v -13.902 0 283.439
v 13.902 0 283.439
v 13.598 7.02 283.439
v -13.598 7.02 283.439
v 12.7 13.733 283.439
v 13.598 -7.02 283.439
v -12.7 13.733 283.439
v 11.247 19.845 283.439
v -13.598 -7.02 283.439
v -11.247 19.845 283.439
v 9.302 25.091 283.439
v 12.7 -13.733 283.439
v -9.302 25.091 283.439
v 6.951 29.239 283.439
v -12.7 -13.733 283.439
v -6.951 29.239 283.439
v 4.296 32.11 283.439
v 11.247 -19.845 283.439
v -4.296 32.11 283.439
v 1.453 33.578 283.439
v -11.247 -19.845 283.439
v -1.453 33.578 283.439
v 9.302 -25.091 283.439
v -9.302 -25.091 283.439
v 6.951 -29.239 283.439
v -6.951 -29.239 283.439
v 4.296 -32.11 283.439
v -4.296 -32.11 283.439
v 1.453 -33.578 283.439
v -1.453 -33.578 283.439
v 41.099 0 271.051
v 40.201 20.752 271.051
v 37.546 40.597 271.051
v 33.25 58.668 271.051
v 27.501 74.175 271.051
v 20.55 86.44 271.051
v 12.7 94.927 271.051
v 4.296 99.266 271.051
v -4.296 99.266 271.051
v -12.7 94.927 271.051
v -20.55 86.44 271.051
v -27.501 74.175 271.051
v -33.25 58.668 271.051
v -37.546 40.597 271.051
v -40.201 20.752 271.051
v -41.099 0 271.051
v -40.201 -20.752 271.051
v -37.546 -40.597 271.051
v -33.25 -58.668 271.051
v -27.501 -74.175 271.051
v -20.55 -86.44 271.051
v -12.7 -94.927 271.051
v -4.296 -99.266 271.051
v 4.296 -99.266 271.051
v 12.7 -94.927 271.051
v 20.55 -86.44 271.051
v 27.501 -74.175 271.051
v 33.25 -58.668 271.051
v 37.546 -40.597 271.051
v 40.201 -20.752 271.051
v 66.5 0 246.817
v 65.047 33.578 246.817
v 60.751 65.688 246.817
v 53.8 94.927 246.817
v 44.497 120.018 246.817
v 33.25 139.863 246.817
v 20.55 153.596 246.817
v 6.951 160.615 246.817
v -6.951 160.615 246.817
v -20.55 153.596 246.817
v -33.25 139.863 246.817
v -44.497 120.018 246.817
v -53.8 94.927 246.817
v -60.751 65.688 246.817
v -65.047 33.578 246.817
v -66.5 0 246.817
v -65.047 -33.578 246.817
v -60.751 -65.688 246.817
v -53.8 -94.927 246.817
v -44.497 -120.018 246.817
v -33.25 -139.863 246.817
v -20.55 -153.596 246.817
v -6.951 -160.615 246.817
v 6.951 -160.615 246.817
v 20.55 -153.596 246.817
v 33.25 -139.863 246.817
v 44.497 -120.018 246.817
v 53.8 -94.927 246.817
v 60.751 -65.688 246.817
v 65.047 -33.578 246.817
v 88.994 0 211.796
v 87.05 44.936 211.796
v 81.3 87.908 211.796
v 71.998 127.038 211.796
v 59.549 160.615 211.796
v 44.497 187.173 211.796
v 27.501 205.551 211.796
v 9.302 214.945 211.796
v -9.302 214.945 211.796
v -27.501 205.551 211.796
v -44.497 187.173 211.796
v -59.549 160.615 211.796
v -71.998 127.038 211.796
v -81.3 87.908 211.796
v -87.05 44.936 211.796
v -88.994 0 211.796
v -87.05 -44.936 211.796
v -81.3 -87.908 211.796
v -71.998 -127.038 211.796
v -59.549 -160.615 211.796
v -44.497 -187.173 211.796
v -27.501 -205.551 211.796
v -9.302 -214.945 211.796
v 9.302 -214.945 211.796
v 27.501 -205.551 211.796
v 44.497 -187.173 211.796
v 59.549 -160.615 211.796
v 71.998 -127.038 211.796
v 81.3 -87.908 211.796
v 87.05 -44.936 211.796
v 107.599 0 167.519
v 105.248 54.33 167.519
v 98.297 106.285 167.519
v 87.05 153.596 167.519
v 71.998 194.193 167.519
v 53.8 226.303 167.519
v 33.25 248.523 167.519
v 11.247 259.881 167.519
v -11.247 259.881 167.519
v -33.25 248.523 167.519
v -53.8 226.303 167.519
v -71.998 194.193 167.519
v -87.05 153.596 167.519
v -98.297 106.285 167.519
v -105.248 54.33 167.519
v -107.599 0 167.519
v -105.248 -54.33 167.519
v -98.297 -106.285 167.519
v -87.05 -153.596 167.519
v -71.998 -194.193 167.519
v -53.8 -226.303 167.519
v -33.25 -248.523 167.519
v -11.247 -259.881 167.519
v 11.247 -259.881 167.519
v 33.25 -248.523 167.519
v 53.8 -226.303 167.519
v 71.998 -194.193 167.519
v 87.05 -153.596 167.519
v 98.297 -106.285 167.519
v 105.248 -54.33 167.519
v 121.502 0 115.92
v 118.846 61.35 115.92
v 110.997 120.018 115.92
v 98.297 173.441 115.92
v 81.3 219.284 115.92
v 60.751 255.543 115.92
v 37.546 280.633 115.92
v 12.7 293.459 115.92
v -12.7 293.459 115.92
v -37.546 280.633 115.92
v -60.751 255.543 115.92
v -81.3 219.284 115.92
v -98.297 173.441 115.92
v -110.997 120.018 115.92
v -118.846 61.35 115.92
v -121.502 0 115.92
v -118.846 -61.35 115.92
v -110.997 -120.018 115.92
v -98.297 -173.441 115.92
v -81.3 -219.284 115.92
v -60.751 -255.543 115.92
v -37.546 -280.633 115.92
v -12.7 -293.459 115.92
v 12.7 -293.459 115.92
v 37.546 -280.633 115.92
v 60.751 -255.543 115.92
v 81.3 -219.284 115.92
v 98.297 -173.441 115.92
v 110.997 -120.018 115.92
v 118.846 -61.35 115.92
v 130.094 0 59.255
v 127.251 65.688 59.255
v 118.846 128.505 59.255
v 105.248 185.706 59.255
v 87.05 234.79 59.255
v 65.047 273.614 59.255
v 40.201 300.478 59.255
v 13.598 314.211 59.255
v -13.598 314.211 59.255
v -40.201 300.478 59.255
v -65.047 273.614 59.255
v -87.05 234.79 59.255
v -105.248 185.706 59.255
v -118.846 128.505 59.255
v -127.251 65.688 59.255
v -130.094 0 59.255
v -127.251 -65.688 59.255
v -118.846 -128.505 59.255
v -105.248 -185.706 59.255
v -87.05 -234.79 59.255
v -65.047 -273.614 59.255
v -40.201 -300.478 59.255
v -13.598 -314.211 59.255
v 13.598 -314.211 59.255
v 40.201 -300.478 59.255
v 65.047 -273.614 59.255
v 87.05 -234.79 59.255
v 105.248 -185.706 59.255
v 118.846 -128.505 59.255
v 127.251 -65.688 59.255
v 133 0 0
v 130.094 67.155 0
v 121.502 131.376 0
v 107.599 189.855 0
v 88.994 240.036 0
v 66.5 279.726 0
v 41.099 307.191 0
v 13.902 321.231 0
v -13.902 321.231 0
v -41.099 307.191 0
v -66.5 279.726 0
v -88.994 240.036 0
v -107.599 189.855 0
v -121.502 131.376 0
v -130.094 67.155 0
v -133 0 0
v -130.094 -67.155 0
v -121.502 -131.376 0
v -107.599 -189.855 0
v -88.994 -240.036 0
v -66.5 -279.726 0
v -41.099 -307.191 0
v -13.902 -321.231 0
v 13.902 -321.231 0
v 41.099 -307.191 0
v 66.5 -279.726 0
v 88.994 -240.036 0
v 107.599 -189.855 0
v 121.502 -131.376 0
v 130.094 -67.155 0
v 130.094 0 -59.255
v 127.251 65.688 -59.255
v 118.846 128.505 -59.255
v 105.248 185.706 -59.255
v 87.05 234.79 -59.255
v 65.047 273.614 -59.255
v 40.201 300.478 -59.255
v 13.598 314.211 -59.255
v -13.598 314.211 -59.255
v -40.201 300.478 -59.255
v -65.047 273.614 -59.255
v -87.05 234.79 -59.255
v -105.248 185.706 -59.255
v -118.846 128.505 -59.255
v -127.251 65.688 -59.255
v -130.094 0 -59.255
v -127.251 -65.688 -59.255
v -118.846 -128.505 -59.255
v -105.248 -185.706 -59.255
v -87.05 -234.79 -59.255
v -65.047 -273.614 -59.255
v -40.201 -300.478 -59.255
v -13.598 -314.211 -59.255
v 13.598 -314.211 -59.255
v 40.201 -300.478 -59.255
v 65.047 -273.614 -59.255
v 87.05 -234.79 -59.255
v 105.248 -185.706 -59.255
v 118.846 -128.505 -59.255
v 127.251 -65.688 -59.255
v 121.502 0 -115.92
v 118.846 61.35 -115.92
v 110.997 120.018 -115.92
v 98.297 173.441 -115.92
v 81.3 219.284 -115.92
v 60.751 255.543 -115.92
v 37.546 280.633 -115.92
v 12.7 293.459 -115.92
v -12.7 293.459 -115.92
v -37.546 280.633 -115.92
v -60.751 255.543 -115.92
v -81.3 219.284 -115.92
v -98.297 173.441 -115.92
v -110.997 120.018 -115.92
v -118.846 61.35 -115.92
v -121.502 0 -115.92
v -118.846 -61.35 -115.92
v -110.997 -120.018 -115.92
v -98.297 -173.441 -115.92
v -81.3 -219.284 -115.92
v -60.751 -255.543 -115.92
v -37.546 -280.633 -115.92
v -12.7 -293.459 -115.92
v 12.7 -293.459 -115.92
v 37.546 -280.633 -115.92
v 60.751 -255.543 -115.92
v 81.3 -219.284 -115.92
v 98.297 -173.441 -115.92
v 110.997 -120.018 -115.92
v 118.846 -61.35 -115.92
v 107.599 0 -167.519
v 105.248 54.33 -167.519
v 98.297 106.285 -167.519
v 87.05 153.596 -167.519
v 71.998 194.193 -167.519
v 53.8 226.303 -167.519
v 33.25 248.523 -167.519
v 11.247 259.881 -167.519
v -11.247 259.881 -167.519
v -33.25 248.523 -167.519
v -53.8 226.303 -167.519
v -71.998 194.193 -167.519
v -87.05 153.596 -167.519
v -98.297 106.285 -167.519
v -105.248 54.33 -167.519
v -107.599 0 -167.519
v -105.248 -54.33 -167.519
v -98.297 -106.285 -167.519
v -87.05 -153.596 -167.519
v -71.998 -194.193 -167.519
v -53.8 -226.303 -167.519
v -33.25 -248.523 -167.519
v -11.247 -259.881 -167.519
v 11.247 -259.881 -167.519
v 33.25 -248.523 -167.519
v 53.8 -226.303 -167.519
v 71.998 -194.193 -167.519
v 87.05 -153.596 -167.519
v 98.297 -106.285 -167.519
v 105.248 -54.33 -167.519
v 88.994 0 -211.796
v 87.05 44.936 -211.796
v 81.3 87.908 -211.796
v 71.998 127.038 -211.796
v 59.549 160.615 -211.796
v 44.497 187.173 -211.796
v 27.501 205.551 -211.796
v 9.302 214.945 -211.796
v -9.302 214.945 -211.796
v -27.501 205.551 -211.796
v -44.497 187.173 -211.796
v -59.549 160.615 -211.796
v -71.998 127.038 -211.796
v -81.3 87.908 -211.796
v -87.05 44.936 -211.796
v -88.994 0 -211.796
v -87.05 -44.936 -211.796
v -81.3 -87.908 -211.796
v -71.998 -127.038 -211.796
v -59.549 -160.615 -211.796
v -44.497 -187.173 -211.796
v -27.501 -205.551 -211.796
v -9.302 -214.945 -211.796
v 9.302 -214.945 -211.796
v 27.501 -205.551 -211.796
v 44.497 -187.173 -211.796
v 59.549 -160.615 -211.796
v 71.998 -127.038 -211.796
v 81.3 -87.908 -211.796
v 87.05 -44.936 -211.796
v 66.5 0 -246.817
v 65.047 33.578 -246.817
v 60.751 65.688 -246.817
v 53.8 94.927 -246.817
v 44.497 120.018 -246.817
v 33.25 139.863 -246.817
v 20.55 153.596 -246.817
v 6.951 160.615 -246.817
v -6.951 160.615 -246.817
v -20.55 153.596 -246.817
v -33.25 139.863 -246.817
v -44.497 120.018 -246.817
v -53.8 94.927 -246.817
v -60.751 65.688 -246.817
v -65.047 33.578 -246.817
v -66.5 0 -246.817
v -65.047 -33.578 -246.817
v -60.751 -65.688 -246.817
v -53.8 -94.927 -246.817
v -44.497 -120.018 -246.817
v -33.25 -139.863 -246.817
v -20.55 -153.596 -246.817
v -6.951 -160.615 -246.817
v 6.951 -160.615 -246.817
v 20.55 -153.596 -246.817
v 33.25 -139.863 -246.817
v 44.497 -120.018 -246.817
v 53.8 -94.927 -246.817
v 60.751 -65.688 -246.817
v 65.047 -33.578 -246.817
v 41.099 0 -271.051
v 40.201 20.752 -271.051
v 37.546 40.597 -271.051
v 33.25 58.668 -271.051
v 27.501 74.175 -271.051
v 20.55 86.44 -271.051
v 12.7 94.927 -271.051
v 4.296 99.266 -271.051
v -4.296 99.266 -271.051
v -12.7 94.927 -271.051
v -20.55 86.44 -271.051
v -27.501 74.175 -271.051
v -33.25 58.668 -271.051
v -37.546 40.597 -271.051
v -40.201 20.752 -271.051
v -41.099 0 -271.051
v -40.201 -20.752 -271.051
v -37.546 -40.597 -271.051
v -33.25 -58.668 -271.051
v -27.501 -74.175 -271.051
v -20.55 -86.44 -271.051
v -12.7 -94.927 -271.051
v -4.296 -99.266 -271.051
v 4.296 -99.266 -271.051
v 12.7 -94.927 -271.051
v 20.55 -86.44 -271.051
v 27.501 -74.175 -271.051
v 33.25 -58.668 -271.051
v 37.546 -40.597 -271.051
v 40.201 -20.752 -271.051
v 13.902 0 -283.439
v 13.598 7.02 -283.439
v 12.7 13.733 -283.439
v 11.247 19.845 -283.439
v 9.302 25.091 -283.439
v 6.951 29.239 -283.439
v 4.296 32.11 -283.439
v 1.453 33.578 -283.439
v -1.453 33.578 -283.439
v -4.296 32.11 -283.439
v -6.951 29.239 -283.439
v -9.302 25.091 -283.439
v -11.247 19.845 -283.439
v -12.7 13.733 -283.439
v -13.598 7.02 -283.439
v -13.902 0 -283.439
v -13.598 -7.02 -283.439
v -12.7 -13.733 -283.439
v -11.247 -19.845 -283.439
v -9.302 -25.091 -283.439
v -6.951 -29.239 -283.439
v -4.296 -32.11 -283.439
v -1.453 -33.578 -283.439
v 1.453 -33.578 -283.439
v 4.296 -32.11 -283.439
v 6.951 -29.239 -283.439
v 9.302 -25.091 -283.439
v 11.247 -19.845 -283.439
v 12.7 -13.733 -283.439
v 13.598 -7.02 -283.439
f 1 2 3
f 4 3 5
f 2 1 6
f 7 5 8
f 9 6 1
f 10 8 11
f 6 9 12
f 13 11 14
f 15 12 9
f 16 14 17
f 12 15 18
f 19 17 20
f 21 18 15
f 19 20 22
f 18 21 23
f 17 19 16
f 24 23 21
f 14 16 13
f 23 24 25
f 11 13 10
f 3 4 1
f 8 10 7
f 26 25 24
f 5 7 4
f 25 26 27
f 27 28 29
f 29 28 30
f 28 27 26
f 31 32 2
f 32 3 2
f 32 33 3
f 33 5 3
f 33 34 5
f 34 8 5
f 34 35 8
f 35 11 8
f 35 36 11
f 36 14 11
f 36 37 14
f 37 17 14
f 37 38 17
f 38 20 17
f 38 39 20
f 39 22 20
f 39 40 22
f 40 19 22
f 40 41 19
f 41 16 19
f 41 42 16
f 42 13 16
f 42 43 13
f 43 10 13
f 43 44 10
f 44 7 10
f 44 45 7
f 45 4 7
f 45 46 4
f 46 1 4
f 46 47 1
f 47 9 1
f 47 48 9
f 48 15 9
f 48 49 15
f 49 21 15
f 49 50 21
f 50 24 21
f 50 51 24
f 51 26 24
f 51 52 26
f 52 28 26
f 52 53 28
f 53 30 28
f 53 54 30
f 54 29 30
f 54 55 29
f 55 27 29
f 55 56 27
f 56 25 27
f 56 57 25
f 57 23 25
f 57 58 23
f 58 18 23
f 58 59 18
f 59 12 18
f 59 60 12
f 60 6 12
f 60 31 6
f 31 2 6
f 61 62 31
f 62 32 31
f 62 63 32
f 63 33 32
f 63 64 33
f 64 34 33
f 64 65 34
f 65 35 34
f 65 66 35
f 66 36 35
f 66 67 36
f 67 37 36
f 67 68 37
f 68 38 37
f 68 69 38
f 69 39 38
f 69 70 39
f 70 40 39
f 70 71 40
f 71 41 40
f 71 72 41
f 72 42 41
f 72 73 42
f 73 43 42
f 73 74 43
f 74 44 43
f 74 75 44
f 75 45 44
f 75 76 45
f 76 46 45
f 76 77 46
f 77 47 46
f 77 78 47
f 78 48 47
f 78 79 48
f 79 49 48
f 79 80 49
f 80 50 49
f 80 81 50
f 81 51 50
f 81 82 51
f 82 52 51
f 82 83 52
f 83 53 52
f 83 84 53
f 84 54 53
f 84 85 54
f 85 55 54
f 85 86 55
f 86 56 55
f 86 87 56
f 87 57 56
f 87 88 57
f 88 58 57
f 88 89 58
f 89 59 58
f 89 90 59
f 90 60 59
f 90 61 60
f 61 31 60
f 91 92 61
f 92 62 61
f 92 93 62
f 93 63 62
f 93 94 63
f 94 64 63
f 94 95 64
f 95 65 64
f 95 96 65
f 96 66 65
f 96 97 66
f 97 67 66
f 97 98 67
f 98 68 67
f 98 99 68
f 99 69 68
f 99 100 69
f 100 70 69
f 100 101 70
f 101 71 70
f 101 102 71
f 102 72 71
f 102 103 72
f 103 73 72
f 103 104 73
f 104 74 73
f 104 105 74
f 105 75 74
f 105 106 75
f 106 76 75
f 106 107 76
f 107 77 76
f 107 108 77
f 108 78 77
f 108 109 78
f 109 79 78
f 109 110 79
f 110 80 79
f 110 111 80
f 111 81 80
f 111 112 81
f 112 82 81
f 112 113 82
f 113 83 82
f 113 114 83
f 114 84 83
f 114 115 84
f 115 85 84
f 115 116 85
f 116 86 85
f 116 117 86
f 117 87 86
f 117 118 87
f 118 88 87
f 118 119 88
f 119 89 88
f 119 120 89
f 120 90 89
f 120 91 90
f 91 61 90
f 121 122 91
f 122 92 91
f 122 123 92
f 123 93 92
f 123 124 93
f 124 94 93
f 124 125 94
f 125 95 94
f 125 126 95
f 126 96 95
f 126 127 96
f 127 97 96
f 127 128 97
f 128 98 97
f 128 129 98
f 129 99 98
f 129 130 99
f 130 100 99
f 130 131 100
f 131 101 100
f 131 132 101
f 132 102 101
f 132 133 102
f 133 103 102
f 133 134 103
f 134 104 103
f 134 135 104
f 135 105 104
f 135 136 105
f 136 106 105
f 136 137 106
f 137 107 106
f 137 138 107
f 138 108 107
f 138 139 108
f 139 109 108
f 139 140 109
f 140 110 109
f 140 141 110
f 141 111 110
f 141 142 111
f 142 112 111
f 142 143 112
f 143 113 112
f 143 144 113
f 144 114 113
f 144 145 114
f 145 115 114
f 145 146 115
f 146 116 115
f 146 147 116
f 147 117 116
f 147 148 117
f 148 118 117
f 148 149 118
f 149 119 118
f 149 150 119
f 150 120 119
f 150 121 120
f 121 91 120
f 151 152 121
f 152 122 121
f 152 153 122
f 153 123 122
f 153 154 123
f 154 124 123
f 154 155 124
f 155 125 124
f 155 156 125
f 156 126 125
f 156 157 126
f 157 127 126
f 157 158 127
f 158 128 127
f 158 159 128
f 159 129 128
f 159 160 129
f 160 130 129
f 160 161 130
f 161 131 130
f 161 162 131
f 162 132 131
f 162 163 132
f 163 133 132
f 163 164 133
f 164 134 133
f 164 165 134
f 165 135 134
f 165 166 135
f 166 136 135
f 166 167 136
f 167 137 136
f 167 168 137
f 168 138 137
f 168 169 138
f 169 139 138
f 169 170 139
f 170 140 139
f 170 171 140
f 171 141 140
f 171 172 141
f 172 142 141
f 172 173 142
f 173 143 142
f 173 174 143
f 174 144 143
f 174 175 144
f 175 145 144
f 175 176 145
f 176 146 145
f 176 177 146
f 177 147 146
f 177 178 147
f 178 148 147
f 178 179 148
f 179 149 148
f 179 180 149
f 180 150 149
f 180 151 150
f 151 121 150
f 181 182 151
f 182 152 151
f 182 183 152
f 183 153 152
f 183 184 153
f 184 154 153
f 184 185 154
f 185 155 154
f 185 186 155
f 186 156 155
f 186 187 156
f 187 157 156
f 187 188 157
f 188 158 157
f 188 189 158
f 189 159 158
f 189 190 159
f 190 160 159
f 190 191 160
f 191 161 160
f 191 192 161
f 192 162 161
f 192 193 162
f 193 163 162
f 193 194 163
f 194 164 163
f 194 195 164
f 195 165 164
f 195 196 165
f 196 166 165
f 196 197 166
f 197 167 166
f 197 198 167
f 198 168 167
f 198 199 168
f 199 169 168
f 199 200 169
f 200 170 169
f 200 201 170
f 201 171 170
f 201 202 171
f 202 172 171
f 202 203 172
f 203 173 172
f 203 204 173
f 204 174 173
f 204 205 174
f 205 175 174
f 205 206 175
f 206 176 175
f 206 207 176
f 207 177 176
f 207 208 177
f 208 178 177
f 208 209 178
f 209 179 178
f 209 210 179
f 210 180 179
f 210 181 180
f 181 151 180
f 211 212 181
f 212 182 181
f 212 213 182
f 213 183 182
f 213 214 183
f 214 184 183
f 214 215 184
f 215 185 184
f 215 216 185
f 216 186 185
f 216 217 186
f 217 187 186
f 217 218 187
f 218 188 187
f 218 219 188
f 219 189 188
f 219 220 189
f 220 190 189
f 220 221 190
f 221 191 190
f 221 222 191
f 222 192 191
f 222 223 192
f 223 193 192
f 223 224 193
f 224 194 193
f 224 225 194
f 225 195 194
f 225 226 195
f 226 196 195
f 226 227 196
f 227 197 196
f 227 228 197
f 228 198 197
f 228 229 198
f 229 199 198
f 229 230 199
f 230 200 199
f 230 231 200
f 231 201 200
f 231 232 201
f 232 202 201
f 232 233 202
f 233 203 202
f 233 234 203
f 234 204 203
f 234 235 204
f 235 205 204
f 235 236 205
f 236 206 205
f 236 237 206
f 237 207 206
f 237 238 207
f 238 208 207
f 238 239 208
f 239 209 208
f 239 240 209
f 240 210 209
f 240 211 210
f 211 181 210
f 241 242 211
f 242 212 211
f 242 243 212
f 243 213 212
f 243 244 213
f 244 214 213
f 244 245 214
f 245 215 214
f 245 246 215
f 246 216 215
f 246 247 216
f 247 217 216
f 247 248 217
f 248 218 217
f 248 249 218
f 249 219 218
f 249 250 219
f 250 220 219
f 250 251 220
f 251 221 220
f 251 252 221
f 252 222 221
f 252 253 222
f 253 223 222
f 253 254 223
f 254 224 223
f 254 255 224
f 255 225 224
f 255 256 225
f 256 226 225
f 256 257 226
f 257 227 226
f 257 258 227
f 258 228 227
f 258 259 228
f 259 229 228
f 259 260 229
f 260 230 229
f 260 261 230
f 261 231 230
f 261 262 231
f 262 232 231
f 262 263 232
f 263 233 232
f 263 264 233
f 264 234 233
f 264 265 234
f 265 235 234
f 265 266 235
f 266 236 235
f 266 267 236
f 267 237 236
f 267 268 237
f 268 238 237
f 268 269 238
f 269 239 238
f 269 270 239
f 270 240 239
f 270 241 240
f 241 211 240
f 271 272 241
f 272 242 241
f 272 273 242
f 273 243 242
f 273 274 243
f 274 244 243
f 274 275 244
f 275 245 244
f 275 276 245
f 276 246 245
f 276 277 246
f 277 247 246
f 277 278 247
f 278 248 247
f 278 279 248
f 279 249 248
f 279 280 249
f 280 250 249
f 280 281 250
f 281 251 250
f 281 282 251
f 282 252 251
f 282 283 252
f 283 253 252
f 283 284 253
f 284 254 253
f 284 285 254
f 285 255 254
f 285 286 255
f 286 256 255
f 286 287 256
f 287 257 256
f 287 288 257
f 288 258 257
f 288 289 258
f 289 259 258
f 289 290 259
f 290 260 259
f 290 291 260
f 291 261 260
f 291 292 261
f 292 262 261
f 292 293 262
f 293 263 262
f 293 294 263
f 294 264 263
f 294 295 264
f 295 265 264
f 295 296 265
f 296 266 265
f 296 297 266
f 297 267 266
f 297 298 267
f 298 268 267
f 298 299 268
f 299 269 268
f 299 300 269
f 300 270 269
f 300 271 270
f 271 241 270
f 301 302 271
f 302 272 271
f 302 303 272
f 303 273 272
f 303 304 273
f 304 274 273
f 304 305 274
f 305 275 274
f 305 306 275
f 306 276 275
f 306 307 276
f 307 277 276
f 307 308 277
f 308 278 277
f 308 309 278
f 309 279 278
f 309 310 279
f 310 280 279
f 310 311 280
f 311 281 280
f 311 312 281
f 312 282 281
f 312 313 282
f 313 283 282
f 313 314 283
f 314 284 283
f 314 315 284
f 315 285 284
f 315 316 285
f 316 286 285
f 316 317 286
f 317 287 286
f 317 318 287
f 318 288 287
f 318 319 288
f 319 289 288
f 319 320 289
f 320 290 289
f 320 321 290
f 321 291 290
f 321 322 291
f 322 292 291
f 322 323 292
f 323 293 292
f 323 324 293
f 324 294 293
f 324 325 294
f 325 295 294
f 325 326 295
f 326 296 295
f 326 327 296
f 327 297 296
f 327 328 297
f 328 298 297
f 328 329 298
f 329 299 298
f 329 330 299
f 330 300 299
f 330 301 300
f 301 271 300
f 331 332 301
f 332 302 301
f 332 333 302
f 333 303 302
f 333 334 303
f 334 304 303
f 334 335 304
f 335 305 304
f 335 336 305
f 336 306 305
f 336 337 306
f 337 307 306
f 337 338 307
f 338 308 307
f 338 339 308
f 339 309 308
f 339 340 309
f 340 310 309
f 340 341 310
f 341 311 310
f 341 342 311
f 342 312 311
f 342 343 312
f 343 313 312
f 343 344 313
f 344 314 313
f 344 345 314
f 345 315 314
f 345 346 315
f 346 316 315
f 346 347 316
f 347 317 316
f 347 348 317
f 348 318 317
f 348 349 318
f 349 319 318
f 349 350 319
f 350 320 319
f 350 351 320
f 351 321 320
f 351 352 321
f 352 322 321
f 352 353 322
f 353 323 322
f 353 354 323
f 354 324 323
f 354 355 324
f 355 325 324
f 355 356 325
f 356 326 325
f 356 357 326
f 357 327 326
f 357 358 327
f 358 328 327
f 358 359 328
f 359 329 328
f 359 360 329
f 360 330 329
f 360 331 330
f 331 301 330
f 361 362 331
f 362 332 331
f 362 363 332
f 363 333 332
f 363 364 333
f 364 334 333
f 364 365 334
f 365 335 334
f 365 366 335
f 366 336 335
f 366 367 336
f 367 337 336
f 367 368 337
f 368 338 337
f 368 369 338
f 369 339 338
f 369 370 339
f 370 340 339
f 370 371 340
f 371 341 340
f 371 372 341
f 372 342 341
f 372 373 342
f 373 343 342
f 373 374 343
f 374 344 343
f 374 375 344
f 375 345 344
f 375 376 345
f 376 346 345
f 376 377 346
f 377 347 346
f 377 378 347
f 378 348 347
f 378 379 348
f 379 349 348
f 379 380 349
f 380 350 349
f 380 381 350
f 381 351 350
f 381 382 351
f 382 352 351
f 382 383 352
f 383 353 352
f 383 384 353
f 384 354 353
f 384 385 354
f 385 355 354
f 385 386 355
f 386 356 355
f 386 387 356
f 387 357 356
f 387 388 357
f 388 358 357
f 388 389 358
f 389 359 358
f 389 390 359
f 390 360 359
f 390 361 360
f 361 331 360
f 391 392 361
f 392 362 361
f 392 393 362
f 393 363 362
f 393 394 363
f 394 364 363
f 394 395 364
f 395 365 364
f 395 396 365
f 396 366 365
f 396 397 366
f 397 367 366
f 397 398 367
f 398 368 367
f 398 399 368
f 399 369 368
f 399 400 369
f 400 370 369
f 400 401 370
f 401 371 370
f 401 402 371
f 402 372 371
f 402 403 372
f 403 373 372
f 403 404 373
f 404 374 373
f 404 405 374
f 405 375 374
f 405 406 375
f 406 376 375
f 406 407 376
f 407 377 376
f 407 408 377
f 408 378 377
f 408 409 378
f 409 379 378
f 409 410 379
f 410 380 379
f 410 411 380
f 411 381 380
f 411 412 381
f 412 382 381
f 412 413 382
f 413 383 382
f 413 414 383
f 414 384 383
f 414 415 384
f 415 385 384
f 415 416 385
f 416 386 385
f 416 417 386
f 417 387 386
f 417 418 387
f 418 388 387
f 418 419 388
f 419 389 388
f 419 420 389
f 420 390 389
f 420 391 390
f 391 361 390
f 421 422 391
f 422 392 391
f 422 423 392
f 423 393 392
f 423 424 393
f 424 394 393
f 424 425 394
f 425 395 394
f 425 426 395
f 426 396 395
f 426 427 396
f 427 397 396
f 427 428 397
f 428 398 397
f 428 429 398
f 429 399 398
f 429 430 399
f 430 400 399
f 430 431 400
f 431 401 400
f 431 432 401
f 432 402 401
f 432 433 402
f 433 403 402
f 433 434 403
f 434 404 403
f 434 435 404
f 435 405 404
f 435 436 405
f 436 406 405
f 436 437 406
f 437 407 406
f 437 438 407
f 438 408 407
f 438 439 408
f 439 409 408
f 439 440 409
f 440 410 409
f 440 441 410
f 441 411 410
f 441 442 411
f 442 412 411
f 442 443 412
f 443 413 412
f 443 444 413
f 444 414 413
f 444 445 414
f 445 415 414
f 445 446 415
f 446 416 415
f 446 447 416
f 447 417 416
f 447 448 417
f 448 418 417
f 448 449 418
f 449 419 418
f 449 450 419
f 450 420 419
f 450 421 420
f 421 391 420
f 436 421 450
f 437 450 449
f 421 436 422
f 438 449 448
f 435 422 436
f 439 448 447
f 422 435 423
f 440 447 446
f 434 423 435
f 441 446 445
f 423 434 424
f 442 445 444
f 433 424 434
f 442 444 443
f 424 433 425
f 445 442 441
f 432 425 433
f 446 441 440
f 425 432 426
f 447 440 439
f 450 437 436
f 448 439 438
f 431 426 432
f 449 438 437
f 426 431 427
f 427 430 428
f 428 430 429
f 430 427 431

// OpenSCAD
// Generated by SolidPython 1.0.1 on 2020-07-29 00:46:48


scale(v = [7, 17, 15]) {
	sphere(r = 19);
}
/***********************************************
*********      SolidPython code:      **********
************************************************
 
# import packages: SolidPython
from solid import *
from solid.utils import *
from itertools import chain, combinations, permutations


class Resize:

    def __init__(self, scad_file):
        self.scad_file = scad_file
        #self.scad_file = import_scad(scad_file)
        # cone/cylinder param:
        self.r1 = 0
        self.r2 = 0
        self.h = 0
        # rectangular prism param:
        self.w = 0
        self.l = 0
        # ellipse param:
        self.r = 0

    # import OpenScad code (file name corresponds to shape)


    # classify shape + parameters
    def assign(self, param1, param2, param3):
        if self.scad_file == 'cone.scad':
            self.r1 = param1
            self.r2 = param2
            self.h = param3
        elif self.scad_file == 'cylinder.scad':
            self.r1 = param1
            self.r2 = param2
            self.h = param3
        elif self.scad_file == 'rectangularPrism.scad':
            self.h = param1
            self.l = param2
            self.w = param3
        else:
            self.r = param1
            self.h = param2

    # resize parameters
    def iterate(self):
        x = range(3, 20, 2)
        i = 1
        if self.scad_file == 'cone.scad':
            tempList = list(permutations(x, 2))
            for temp in tempList:
                param1 = temp[0]
                param2 = temp[1]
                filepath = 'produced_scad_files/' + 'cone' + str(param1) + '_' + str(param2) + '_' + '.scad'
                scad_render_to_file(cylinder(h=param1, r1=param2, r2=0), filepath)

        elif self.scad_file == 'cylinder.scad':
            tempList = list(permutations(x, 3))
            for temp in tempList:
                param1 = temp[0]
                param2 = temp[1]
                filepath = 'produced_scad_files/' + 'cylinder' + str(param1) + '_' + str(param2) + '_' + '.scad'
                scad_render_to_file(cylinder(h=param1, r1=param2, r2=param2), filepath)

        elif self.scad_file == 'rectangularPrism.scad':
            tempList = list(permutations(x, 3))
            for temp in tempList:
                param1 = temp[0]
                param2 = temp[1]
                param3 = temp[2]
                filepath = 'produced_scad_files/' + 'rectangularPrism' + str(param1) + '_' + str(param2) + '_' + str(
                    param3) + '.scad'
                scad_render_to_file(cube(size=(param1, param2, param3)), filepath)

        elif self.scad_file == 'ellipse.scad':
            tempList = list(permutations(x, 4))
            for temp in tempList:
                param1 = temp[0]
                param2 = temp[1]
                param3 = temp[2]
                param4 = temp[3]
                filepath = 'produced_scad_files/' + 'ellipse' + str(param1) + '_' + str(param2) + '_' + str(param3) + '_' + str(param4) + '.scad'
                scad_render_to_file(scale([param1, param2, param3])(sphere(r=param4)), filepath)

    def render_to_scadfile(self):
        scad_render_to_file(scad, 'example.scad') 
 
************************************************/
